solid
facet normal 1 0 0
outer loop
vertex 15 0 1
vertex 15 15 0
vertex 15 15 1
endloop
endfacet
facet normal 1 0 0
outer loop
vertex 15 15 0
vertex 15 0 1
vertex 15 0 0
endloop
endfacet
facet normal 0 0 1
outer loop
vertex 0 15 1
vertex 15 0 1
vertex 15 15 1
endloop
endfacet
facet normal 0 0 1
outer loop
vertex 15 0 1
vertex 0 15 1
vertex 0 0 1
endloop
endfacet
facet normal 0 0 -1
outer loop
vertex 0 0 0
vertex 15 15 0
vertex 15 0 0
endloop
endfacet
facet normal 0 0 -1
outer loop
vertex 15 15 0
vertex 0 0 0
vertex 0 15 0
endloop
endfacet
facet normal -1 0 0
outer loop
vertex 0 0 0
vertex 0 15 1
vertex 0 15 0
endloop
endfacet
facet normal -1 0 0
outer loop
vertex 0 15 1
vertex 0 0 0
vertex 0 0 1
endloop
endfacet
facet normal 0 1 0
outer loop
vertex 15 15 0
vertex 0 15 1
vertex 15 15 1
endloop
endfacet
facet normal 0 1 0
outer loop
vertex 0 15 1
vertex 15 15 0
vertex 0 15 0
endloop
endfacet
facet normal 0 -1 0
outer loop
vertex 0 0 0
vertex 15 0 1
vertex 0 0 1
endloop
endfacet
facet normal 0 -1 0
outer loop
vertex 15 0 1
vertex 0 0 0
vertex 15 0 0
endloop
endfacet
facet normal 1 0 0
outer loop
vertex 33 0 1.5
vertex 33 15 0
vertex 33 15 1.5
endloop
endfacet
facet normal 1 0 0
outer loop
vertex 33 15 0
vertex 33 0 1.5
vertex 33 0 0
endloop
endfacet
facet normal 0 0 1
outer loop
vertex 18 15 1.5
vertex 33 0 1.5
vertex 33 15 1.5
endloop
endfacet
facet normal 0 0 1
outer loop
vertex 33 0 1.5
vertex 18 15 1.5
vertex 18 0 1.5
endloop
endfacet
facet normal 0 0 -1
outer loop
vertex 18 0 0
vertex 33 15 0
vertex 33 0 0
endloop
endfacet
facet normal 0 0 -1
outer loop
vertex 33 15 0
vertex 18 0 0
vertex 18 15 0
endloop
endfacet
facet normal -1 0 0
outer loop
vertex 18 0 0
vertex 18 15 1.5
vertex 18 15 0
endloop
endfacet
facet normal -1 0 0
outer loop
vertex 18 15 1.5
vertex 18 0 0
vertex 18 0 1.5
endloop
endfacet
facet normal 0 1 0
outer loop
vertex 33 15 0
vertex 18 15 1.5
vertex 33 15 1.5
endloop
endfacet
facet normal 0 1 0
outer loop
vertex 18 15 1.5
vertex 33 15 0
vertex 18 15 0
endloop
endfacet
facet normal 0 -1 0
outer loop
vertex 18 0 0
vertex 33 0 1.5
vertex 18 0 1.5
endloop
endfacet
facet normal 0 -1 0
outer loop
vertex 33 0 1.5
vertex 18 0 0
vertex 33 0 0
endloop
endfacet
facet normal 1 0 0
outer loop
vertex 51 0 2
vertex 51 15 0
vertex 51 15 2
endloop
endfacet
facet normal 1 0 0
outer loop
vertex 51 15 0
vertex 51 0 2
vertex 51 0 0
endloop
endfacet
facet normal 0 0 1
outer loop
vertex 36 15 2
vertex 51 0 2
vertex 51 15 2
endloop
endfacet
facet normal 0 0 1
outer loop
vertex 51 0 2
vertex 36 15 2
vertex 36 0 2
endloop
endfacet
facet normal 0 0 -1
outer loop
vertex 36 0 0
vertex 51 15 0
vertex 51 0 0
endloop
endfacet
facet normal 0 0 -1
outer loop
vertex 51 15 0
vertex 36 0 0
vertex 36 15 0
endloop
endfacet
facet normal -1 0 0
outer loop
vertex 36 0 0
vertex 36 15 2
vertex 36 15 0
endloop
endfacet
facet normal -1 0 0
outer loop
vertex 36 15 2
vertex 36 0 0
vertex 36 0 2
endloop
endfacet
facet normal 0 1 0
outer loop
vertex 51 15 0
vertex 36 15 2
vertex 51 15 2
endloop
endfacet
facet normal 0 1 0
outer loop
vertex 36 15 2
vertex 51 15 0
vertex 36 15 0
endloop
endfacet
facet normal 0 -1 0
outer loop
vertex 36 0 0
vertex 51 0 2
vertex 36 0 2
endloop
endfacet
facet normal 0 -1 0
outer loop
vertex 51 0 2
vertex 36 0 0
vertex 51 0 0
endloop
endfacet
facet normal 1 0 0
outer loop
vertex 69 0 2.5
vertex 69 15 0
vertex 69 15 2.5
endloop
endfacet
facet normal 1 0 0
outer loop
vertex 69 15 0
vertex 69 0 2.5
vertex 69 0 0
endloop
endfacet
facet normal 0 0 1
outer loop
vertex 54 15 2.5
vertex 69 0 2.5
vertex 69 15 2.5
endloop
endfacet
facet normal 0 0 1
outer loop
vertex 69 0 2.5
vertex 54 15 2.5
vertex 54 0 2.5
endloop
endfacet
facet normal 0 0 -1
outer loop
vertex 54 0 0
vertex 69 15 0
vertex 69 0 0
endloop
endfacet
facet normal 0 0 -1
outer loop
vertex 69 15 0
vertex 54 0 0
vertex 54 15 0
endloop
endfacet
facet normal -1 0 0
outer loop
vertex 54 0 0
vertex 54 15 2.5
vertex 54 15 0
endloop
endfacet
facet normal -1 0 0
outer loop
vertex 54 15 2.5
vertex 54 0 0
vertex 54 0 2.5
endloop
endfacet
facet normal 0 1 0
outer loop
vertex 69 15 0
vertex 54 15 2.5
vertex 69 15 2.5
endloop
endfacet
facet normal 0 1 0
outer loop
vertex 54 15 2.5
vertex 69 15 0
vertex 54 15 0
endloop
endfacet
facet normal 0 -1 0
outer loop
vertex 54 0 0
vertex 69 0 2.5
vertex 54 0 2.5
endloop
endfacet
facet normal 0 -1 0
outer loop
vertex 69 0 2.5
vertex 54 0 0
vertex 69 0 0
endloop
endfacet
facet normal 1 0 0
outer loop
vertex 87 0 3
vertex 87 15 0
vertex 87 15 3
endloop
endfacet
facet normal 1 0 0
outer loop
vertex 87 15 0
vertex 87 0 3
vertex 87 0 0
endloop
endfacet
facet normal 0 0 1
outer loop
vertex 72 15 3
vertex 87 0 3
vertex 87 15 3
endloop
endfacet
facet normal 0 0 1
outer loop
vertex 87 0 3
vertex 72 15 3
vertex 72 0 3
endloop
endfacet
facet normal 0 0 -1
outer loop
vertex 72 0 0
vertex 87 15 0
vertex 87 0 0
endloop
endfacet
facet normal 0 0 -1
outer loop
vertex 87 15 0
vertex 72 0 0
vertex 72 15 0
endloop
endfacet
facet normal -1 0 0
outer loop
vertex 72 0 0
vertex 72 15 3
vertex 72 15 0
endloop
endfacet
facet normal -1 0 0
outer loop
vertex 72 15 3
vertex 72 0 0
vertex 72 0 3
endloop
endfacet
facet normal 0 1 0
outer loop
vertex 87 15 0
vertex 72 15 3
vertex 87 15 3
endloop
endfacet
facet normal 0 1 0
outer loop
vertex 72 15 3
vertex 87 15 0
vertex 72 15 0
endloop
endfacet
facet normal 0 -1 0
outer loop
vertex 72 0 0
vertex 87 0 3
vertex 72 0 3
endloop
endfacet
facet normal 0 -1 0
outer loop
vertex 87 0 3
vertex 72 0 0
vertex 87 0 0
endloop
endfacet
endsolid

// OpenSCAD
/*
	z-ladder — 层高标记阶梯（1.0/1.5/2.0/2.5/3.0 mm）

	测什么
		五个方块，高度 1.0 / 1.5 / 2.0 / 2.5 / 3.0 mm。
		用候选层高打一遍，量每块实际高度：能被层高整除的块，顶面正好是一层的
		结束；不能整除的块，顶面会落在半层上，高度和表面纹理都会露馅。

	怎么判读
		- 卡尺量五块实际高度，与设计值比对。
		- 除以层数（侧面数条纹可数）反推**实际层高**：实测高度 / 层数。
		- 0.2 层高下：1.0 / 2.0 / 3.0 是整数层（5/10/15 层），
		  1.5 / 2.5 是 7.5 / 12.5 层——这两块顶面会少半层、看起来发亮/被压。
		- 0.15 层高下反过来：1.5 / 3.0 正好，1.0 / 2.0 不整除。
		- 五块高度全部比设计值少 0.1–0.2 mm：首层被压，调 z-offset。
		- 如果 1.0 块量出 1.4：说明实际层高 0.28 而不是 0.2（层高被切片器抬了）。

	期望值（默认参数）
		STL 体积 2.250 cm³，包围盒 87.00 × 15.00 × 3.00 mm，5 个独立实体，水密。
		Z 包围盒 = 最高的那块 3.0 mm。

	参数
		h_1..5       五块高度 (mm)
		block_w/d    每块宽 / 深 (mm)
		gap          块间距 (X)
*/

/* [标记块高度 (mm)] */
h_1 = 1.0;        // 5 × 0.2 层
h_2 = 1.5;        // 7.5 × 0.2 层：不整除，顶面会露馅
h_3 = 2.0;        // 10 × 0.2 层
h_4 = 2.5;        // 12.5 × 0.2 层
h_5 = 3.0;        // 15 × 0.2 层

/* [尺寸] */
block_w = 15;     // 每块 X
block_d = 15;     // 每块 Y
gap = 3;          // 块间距 (X)

assert(min([h_1, h_2, h_3, h_4, h_5]) > 0, "块高必须 > 0");
assert(block_w > 0 && block_d > 0, "block_w / block_d 必须 > 0");

heights = [h_1, h_2, h_3, h_4, h_5];
n_blocks = len(heights);

union() {
	for (i = [0:n_blocks - 1]) {
		translate([i * (block_w + gap), 0, 0]) cube([block_w, block_d, heights[i]]);
	}
}
